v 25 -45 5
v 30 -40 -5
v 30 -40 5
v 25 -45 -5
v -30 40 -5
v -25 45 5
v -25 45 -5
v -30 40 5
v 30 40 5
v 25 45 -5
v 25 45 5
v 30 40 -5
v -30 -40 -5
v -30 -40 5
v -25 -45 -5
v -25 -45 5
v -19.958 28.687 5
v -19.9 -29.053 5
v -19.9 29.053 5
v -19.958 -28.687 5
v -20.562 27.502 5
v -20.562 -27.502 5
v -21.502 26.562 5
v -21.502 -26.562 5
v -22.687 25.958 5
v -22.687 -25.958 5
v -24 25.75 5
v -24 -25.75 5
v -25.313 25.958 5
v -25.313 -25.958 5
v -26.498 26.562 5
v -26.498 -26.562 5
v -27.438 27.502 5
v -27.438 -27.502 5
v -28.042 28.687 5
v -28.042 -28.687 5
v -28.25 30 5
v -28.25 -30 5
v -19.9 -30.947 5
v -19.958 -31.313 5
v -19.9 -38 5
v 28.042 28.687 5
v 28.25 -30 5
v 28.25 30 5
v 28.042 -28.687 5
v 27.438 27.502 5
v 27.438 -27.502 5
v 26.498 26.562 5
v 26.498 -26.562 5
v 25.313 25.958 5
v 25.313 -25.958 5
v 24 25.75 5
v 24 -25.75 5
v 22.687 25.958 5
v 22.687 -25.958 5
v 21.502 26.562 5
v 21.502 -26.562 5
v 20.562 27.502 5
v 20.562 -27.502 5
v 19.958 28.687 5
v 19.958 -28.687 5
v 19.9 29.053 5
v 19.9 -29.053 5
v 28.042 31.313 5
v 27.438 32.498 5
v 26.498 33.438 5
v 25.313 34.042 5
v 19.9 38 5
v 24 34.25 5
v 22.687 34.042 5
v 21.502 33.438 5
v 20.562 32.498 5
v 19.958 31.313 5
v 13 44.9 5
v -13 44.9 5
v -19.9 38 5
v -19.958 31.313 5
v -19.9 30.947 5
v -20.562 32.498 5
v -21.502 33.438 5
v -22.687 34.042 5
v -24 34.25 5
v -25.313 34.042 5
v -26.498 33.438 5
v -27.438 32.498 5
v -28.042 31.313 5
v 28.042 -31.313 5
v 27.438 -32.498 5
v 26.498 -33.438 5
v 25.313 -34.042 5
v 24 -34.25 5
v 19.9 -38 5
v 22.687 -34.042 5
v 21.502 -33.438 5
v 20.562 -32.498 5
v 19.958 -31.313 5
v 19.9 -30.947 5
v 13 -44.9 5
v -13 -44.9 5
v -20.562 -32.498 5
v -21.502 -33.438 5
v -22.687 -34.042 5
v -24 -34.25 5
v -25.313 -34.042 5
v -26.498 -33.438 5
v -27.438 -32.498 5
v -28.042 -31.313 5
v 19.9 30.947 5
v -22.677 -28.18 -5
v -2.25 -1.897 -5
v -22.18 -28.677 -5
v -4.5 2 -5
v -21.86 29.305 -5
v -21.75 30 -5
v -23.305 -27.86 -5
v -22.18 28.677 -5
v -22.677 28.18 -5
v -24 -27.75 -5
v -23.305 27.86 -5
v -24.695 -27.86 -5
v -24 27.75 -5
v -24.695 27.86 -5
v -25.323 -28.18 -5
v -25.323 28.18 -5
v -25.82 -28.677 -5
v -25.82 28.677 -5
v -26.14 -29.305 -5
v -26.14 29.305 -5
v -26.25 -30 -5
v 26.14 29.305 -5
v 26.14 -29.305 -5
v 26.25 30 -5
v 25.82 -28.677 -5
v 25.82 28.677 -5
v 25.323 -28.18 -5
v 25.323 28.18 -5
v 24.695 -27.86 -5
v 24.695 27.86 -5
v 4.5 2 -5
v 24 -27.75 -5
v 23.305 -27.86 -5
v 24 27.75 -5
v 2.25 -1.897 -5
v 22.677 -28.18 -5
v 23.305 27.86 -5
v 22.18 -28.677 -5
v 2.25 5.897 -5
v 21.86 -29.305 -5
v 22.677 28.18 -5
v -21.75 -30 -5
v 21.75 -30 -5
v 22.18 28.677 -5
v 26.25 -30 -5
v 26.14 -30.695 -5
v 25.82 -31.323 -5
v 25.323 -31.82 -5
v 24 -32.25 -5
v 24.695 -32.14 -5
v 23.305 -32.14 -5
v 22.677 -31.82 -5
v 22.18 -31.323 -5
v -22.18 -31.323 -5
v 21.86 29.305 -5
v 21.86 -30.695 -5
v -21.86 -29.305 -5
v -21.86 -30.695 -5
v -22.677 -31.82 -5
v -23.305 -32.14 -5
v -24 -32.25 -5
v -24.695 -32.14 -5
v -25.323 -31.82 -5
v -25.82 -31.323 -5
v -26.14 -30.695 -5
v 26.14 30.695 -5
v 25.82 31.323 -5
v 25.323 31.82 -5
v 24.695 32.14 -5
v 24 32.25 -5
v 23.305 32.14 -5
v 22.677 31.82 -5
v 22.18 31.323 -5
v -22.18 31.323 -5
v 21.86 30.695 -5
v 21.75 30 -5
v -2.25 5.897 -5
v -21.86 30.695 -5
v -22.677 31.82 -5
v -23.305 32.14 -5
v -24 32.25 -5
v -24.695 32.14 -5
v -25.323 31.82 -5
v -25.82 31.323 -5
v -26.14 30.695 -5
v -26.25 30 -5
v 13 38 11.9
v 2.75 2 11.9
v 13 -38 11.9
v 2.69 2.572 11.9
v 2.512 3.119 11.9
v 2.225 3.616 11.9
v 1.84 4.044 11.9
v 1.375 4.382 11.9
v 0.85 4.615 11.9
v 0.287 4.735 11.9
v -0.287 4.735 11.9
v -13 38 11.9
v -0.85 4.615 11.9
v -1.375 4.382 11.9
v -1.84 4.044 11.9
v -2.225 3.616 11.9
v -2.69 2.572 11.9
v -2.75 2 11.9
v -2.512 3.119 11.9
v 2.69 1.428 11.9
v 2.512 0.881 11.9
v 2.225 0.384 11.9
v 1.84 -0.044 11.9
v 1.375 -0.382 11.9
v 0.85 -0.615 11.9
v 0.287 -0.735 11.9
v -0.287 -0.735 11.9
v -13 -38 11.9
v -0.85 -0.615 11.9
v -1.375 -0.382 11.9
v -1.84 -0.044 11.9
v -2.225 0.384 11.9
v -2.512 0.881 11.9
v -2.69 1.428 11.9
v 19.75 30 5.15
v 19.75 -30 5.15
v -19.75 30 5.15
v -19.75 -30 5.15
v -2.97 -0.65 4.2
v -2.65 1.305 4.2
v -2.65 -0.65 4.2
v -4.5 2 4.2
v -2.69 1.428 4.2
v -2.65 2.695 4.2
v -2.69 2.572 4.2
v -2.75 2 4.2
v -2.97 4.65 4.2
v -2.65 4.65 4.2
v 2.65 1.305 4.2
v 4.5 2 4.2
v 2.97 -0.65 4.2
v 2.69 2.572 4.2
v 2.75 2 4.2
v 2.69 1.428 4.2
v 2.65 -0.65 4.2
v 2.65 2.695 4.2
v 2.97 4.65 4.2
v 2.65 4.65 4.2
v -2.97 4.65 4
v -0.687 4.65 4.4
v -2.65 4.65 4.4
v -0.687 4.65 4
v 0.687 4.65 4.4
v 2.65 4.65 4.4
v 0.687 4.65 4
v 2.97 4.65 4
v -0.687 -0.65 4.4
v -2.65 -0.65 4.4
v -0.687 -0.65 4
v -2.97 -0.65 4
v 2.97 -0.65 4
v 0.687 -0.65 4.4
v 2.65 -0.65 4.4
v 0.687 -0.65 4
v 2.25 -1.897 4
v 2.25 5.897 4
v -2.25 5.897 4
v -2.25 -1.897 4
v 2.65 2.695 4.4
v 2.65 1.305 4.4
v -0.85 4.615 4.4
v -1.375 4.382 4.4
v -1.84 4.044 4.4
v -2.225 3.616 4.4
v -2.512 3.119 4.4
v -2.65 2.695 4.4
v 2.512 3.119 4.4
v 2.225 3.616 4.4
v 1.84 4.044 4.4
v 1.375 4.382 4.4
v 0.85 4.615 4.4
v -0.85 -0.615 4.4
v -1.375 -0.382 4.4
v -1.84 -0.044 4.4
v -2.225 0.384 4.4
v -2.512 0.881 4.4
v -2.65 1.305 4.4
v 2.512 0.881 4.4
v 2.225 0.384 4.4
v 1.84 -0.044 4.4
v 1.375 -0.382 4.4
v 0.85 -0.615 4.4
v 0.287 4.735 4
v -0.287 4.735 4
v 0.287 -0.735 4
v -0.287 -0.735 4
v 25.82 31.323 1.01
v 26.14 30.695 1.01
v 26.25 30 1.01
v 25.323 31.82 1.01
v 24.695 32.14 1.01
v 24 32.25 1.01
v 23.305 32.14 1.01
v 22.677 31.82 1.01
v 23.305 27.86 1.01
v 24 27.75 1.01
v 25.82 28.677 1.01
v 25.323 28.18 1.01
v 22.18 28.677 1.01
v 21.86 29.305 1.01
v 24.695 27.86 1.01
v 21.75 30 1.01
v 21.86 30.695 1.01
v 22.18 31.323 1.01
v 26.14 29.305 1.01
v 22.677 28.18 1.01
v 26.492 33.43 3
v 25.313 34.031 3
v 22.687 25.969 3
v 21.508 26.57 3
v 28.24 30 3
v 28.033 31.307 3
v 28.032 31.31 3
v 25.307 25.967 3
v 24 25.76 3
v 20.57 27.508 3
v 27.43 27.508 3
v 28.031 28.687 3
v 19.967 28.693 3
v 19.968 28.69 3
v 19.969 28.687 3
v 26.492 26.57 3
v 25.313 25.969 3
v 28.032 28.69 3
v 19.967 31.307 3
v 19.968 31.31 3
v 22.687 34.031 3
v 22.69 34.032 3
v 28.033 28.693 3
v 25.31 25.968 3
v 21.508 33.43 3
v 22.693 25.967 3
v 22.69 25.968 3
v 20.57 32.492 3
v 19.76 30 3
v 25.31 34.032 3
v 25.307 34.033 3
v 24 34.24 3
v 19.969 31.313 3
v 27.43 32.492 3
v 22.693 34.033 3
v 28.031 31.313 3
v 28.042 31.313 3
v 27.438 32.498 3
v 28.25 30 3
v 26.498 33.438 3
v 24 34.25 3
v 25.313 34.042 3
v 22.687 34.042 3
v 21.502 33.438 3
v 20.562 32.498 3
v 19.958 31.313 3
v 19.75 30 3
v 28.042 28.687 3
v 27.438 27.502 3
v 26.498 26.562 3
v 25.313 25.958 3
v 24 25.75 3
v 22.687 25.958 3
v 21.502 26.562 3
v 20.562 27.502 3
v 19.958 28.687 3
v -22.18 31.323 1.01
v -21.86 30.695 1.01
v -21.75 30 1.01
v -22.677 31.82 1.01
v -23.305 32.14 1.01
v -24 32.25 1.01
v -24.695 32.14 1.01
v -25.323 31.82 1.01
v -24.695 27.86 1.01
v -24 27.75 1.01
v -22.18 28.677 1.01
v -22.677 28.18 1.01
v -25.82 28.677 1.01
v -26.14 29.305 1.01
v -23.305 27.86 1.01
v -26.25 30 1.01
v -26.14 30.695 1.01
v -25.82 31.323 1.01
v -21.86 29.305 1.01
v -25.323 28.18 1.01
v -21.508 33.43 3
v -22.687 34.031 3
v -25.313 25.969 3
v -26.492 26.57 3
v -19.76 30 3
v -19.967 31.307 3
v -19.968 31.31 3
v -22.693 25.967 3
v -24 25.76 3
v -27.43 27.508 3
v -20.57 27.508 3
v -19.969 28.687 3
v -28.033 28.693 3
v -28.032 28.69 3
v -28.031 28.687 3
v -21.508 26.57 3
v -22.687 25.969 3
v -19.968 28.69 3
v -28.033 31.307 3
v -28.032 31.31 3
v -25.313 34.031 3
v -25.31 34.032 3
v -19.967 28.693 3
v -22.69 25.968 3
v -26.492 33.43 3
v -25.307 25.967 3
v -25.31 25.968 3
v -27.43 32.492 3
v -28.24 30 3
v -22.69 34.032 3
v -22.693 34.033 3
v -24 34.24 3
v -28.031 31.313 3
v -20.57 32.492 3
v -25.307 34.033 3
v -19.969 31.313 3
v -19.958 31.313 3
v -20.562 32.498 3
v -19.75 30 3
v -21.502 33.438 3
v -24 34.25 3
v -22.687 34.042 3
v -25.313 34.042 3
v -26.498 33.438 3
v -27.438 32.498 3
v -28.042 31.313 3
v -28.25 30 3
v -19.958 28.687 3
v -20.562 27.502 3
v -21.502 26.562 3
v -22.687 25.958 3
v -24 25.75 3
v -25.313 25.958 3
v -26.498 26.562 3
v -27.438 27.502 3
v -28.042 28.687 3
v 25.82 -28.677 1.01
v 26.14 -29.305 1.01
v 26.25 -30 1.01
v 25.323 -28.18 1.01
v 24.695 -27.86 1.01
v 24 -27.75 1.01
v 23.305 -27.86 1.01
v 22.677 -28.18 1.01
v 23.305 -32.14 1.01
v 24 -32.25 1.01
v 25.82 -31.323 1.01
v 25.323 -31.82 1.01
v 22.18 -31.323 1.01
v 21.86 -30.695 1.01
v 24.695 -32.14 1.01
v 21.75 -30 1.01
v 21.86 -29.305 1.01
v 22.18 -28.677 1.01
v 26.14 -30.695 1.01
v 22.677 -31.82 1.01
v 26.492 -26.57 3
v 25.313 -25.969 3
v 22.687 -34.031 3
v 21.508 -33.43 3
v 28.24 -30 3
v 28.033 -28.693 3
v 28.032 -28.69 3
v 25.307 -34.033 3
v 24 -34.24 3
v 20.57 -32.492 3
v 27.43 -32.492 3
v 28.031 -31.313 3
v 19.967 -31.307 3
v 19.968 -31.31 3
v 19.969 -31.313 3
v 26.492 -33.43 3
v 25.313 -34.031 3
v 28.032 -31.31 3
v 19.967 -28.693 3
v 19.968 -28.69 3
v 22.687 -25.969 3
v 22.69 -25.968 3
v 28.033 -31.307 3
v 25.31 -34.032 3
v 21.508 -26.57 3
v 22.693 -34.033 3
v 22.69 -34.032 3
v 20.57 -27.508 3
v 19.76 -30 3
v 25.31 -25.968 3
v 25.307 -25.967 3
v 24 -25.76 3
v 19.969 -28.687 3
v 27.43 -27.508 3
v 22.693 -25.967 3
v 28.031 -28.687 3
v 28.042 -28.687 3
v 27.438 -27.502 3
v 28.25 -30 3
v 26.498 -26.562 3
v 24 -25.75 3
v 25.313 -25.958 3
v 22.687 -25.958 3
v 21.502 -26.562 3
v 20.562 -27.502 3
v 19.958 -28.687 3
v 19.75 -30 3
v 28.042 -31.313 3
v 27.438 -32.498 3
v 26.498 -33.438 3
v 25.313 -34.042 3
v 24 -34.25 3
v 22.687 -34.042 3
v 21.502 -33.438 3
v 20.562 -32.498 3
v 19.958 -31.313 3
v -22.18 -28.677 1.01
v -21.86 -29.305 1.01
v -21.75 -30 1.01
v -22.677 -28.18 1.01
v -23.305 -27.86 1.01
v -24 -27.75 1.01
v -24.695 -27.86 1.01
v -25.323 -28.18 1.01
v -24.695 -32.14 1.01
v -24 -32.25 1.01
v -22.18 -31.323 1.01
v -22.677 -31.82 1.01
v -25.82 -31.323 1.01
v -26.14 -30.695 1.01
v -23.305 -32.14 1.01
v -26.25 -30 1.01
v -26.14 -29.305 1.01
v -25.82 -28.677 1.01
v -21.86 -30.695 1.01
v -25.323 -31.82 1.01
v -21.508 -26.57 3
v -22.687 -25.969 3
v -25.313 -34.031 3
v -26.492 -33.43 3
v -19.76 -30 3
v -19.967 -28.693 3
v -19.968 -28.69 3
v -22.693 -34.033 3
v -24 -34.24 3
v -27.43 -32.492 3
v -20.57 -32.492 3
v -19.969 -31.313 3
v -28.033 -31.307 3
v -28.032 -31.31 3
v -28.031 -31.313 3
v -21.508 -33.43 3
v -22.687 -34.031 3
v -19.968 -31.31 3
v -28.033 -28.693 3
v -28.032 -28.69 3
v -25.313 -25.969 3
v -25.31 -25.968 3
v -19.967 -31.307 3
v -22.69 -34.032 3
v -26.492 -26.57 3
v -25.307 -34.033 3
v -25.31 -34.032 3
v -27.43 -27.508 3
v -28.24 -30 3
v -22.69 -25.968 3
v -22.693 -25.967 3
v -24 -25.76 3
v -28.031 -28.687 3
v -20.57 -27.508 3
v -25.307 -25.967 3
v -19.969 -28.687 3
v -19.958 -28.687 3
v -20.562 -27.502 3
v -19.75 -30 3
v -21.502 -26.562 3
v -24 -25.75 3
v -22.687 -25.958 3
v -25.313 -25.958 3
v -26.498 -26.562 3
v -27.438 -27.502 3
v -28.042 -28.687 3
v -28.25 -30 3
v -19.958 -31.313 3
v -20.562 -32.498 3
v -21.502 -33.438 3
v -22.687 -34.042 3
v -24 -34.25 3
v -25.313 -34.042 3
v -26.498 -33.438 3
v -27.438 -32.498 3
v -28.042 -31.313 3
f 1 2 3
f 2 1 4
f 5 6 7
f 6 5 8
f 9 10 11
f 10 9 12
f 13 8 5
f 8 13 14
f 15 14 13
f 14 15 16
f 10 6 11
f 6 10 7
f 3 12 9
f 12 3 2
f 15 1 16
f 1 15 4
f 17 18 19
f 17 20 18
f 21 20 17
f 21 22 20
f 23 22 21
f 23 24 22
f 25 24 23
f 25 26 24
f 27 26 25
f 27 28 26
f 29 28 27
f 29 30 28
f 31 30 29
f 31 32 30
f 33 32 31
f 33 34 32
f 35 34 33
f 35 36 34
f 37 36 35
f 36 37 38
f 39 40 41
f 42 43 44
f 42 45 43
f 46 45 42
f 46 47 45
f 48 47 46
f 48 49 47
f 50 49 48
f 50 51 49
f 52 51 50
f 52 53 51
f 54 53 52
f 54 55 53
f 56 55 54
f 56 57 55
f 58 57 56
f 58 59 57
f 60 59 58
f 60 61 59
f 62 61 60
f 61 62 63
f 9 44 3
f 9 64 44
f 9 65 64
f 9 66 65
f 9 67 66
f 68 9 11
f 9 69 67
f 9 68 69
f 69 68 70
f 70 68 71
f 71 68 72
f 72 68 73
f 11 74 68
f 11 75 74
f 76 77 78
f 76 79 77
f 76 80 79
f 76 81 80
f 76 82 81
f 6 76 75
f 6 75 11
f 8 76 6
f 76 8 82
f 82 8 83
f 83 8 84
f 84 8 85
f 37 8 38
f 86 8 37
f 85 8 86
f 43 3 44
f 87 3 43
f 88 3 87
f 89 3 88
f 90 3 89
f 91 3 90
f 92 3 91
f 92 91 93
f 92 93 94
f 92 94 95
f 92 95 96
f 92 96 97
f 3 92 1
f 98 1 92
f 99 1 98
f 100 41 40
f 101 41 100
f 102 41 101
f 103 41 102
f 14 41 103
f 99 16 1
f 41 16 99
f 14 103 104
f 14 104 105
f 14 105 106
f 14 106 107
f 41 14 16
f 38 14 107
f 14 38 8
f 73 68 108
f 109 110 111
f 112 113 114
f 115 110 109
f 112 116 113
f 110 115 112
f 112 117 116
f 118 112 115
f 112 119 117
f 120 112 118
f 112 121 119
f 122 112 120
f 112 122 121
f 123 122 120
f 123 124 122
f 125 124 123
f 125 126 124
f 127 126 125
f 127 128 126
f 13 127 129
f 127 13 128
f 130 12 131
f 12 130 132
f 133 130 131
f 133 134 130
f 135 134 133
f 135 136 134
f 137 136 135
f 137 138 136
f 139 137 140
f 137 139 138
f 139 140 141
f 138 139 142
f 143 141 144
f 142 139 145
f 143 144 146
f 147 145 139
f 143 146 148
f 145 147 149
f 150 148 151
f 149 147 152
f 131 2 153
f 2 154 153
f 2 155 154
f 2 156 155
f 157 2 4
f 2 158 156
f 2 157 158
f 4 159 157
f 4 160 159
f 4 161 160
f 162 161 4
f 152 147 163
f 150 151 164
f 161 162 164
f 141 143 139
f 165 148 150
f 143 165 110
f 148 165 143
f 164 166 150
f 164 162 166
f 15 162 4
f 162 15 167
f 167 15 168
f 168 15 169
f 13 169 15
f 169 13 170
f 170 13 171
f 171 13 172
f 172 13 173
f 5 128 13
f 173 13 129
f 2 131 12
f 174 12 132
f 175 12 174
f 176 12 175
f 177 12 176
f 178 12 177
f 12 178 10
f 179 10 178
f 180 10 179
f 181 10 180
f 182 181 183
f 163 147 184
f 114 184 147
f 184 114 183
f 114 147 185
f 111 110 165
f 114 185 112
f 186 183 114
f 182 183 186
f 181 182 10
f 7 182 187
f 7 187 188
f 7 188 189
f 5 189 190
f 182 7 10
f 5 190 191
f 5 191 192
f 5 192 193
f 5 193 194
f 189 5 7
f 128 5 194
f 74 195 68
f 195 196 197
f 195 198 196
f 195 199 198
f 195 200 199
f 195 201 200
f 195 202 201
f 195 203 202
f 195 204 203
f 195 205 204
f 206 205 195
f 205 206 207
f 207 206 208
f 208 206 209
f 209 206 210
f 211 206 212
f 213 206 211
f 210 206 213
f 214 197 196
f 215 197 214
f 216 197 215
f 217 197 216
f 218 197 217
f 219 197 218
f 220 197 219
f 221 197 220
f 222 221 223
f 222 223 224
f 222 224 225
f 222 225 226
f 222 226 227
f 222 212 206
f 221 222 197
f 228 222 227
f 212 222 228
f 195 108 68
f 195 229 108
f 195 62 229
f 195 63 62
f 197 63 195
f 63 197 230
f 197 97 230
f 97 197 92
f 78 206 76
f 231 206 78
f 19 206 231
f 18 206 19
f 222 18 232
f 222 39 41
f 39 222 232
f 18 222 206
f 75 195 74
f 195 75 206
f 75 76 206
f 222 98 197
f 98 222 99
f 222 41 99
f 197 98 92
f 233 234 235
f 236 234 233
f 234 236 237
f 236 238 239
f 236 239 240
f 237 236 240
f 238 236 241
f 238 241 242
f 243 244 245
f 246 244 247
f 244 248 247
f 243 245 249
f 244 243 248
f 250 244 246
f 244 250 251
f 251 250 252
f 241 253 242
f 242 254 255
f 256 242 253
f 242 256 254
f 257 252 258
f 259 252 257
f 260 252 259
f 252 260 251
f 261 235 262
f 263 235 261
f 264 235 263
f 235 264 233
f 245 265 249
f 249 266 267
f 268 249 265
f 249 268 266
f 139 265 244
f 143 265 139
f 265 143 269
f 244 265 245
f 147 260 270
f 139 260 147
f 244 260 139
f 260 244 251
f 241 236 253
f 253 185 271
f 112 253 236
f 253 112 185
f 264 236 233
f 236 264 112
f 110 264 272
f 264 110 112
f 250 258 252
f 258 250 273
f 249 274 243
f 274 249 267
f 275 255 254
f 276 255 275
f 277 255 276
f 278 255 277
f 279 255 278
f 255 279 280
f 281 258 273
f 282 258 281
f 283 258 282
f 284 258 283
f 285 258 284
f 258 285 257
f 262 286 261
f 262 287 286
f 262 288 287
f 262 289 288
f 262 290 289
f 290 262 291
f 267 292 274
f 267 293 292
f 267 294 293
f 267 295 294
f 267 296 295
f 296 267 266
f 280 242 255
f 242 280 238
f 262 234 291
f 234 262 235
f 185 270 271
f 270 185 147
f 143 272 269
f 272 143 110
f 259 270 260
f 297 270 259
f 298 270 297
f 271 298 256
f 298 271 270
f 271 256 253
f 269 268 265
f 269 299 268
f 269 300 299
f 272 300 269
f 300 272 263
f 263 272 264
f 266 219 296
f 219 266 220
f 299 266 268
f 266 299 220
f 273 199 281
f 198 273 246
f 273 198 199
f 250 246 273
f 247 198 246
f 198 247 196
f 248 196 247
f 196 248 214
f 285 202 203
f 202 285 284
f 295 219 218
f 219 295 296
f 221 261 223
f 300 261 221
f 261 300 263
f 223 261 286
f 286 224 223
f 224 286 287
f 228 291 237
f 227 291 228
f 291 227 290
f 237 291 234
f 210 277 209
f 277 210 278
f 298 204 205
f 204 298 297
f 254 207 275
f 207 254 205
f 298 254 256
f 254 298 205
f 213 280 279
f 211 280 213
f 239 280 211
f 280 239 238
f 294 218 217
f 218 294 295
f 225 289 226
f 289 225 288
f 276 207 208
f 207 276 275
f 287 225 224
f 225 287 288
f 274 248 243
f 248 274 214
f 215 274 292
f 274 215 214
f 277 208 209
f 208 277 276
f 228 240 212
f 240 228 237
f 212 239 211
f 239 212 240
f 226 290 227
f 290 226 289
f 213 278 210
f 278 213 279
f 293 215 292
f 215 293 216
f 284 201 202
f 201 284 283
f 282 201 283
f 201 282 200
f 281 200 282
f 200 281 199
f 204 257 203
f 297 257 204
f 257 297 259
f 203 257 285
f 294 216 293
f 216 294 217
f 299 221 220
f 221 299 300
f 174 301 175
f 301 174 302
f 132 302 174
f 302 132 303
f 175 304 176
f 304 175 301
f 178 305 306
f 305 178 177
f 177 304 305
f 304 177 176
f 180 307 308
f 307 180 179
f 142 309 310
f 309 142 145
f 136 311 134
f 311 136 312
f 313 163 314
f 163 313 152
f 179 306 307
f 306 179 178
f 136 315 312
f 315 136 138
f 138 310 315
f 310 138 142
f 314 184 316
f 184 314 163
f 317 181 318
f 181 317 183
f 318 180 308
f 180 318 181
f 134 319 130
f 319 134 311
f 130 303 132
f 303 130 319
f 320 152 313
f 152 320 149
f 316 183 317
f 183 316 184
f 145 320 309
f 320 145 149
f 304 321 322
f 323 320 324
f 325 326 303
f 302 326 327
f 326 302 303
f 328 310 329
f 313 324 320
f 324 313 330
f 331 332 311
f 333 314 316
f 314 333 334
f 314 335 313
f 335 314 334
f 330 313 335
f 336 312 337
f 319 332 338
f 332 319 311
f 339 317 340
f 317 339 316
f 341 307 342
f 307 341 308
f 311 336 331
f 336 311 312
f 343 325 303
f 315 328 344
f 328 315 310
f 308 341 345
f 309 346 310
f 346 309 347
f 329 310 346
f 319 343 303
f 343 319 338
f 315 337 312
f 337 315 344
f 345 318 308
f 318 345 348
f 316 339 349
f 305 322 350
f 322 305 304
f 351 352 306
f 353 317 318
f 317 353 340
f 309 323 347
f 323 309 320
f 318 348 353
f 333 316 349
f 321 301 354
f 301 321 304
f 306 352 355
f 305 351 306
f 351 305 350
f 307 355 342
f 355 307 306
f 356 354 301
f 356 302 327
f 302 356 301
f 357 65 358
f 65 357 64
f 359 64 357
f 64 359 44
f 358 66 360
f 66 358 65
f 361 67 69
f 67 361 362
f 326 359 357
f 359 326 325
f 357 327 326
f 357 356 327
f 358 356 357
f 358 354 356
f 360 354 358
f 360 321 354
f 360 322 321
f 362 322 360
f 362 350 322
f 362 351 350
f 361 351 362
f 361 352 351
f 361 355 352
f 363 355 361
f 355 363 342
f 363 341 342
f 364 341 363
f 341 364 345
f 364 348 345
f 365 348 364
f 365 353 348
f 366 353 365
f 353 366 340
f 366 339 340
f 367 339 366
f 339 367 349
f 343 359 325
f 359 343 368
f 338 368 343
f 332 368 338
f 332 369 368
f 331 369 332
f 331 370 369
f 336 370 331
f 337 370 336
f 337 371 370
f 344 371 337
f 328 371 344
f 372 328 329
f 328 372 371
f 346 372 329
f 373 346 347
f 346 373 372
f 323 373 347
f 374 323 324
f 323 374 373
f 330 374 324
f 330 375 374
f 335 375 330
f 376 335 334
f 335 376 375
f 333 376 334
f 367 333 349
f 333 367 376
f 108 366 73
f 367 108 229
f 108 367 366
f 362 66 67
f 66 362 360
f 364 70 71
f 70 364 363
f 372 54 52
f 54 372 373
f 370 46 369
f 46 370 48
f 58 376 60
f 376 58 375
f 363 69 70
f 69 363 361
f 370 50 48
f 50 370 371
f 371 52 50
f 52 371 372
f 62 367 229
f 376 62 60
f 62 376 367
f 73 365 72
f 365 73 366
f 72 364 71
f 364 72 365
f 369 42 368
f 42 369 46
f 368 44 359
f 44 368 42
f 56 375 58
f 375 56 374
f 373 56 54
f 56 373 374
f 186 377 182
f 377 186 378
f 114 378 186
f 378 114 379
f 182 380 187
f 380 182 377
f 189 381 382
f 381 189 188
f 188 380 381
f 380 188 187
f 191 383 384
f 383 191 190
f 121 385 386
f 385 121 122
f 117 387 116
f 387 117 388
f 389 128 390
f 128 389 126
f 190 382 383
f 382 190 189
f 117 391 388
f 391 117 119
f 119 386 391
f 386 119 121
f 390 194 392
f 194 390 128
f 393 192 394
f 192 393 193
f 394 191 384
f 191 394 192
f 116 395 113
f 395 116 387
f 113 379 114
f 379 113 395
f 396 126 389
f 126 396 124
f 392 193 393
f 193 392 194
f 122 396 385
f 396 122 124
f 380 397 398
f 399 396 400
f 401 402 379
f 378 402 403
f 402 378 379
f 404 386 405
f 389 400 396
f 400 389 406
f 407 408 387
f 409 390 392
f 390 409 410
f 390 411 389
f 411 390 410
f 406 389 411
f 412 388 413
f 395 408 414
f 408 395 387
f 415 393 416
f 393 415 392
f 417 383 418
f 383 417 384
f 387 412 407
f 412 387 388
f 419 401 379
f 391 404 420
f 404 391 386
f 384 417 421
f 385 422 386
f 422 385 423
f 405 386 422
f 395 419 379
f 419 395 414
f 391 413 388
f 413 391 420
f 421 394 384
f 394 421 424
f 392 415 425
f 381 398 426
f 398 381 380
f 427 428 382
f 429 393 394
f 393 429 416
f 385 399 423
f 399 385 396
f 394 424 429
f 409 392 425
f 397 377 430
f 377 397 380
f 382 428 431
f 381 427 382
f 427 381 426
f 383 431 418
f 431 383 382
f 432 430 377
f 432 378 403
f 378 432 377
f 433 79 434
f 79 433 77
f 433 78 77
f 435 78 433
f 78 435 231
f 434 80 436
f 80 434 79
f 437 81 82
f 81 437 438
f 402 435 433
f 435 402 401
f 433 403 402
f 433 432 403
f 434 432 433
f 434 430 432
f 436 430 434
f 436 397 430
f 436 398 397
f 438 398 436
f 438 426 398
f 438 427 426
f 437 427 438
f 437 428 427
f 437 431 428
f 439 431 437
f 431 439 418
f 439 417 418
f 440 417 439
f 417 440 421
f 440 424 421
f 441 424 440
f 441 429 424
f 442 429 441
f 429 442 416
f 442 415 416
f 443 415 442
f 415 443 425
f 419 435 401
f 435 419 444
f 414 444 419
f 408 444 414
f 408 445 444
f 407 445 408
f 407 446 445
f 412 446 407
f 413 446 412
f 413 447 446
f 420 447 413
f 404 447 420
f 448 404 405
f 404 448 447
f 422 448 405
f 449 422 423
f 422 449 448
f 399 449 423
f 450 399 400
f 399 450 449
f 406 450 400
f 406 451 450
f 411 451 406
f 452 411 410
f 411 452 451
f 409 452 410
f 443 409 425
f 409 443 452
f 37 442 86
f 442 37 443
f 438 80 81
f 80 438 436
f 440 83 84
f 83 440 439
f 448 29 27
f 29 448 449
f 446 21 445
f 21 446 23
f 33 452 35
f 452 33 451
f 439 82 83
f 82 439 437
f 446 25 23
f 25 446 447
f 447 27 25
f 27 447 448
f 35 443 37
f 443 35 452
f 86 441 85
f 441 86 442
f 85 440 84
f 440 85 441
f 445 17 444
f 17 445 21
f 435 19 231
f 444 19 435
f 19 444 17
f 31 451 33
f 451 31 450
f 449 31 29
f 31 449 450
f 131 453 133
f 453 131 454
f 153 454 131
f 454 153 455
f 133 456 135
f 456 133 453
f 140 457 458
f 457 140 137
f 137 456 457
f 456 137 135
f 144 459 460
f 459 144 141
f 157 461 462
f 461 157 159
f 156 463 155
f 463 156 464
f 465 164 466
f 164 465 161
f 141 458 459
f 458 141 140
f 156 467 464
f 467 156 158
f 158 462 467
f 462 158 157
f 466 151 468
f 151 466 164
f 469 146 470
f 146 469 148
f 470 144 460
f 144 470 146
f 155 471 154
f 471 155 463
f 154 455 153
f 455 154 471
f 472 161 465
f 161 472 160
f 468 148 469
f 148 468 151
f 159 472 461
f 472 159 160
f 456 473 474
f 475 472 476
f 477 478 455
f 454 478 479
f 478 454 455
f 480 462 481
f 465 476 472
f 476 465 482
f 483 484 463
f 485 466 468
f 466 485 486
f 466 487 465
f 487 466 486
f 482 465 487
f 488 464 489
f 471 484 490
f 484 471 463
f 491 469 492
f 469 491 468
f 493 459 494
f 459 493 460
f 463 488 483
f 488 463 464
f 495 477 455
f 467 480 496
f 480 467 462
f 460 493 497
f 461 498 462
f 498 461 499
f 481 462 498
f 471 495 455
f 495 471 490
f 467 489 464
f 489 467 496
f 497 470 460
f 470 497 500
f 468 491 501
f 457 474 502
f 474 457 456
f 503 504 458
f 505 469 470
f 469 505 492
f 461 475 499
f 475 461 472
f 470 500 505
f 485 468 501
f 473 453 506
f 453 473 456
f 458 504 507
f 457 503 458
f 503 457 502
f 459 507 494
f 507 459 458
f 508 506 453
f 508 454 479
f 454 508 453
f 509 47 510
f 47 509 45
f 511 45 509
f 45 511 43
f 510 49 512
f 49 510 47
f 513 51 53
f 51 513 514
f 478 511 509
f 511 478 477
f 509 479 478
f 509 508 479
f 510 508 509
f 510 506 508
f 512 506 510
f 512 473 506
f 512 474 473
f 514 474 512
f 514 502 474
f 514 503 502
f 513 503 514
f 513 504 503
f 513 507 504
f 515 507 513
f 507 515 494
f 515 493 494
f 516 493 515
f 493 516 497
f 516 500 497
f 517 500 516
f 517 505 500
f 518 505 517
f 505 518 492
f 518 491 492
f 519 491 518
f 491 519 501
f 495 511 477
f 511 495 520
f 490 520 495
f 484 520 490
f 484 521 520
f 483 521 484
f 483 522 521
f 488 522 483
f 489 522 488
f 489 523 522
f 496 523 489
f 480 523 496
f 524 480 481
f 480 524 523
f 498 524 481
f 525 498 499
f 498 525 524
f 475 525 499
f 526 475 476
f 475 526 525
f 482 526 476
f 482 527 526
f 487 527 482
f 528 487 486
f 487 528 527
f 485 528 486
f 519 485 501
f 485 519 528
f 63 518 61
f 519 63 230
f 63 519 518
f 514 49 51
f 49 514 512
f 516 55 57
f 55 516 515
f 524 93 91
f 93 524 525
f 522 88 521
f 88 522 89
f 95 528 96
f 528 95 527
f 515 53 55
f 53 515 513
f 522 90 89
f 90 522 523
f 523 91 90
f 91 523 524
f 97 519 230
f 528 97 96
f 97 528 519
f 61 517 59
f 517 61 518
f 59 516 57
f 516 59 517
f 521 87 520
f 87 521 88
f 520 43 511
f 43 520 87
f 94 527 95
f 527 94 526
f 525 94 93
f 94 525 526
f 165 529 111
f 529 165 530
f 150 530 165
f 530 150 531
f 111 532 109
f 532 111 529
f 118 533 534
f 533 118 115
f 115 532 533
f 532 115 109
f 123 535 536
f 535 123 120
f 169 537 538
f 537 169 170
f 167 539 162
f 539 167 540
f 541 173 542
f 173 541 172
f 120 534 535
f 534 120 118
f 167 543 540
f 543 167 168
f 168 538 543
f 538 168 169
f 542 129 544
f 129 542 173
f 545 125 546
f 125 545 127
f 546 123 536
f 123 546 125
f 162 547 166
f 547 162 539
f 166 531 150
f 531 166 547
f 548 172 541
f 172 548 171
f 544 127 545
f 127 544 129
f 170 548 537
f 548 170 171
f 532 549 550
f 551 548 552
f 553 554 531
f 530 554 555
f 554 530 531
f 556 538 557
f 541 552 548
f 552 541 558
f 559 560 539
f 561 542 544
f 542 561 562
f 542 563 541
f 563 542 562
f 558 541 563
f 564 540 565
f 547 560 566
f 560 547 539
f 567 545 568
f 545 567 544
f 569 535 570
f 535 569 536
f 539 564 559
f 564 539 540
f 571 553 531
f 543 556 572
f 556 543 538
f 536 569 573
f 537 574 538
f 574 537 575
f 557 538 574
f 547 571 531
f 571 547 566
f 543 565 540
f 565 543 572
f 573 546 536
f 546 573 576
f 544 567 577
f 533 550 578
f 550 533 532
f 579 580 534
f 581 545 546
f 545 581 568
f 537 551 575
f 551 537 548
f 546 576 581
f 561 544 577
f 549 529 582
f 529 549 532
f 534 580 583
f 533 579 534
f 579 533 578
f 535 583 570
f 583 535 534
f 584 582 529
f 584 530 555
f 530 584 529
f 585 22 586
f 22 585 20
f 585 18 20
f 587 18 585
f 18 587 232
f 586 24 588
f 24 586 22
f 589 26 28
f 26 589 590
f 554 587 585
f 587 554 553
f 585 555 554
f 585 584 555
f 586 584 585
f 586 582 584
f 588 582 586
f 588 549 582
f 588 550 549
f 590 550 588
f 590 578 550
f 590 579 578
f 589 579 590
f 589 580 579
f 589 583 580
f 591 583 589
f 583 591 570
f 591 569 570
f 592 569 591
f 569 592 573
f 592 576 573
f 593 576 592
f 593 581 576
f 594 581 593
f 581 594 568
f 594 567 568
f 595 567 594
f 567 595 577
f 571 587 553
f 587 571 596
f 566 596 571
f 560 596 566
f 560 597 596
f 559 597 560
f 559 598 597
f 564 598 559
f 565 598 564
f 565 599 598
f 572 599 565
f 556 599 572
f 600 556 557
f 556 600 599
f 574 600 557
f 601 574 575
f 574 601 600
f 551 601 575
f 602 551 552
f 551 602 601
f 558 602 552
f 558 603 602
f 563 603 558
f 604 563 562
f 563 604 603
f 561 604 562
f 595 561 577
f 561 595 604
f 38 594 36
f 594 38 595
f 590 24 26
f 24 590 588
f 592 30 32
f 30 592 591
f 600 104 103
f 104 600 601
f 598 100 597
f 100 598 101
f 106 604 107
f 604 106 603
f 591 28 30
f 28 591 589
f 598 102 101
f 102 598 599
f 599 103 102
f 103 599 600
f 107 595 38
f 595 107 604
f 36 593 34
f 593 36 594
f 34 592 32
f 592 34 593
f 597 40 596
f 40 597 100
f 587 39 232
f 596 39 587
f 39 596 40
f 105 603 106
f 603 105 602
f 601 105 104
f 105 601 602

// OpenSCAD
// file: ../Dollo/NEW_long_ties/globals.scad
/*
Most things in this file is represented as one millimeter, so keep that in mind while changing things.
Some of the setting are not mm but at variables that you can set, such as 2*x=2x and you are setting what x is.
I will try to specify when things are variables and not exact measurements.
*/

// printer slop
slop = 0.15;

obj_leg = 30;
leg_length = 5.5;
small_number = 0.001;
metal_core_rode_global = 5;


///////////////// number of holes /////////////////////
z_hole_number = 8;
other_holes = 8;

///////////////// Pins /////////////////////

//pins that poke out
ball_size = 10;
pin_height = 20;
pin_diameter = 6;


//holes
hole_ball_size = ball_size;
hole_pin_height = pin_height;
hole_pin_diameter = pin_diameter;

///////////////// Z THINGS /////////////////////

berring_slot_width = 7.5;
berring_slot_depth = 6.5;
metal_core_rode = 5;

///////////////// X THINGS /////////////////////

//male dove tails
male_dove_max_width=8;
male_dove_min_width=5;
male_dove_depth=5;
male_dove_height=obj_leg/2;

function scaled_male_dove_max_width() = male_dove_max_width - slop;
function scaled_male_dove_min_width() = male_dove_min_width - slop;
function scaled_male_dove_depth() = male_dove_depth - slop;

//female dove tails, this is found on the y mounts
girl_max_width=11;
girl_min_width=5;
girl_depth=5;
girl_height=obj_leg;


///////////////// Y THINGS /////////////////////
/*
The Y is so normal that all of those global variables at the top should change all of the setting in it, this section is set her incase there are variables set in the future development of this project.
*/

// stepper
motor_side_length = 43.2;
motor_bolt_hole_distance = 31;
motor_center_hole = 23;
motor_shaft_dia = 5;
motor_shaft_hole_dia = 5+2*slop;

// bolts etc.
bolt_hole_dia = 3+2*slop;
bolt_head_hole_dia = 5.8;

m4_bolt_hole_dia = 4+2*slop;
m4_bolt_head_hole_dia = 6.8+2*slop;


m3_nut_side = 5.65;
m3_nut_height = 2.3;
m4_nut_side = 6.85;
m4_nut_height = 3.1;

// threaded rod
lifter_rod_diam = 9.86;
hole_threaded_rod = lifter_rod_diam+2*slop;

// for the extensions
metal_rod_size = 9;
// main file
use <../Dollo/NEW_long_ties/include.scad>;


w = 110;
h = 60;

//debug();
//debug_table_to_table_bracket();
//debug_table_wall_bracket_2();

//table_wall_bracket();
//table_wall_bracket_2();
table_bracket();
//knob();
//table_to_table_bracket();


module screw_hole() {
    rotate([-90, 0, 0]) {
        cylinder(d=4.5, h=100, center=true, $fn=20);
        cylinder(
            d1=10, d2=24, h=50,
            center=true, $fn=20
        );
    }
    
}

module screw_hole_2() {
    union() {
        cylinder(d=4.5, h=100, center=true, $fn=20);

        cylinder(d1=4.5, d2=8.5, h=2, $fn=20);

        translate([0, 0, 1.99])
        cylinder(d=8.5, h=12, $fn=20);
    }
}

module _table_wall_bracket() {
    difference() {
        cube([w, w, h], center=true);

        hull() {
            cylinder(d=w/2, h=80, center=true, $fn=80);

            translate([w/4, w, 0])
            cube([w, w, h + 10], center=true);

            translate([w, w/2 - w/2.5, 0])
            cube([w, w, h + 10], center=true);
        }

        // positioning hole
        translate([-w/2 - 3, 20, 0])
        chamfered_cube(20, w, h/1.5, 7, center=true);

        // chamfers
        translate([w/2, 0, h/2])
        rotate([0, 45, 0])
        cube([10, 200, 10], center=true);

        translate([w/2, 0, -h/2])
        rotate([0, 45, 0])
        cube([10, 200, 10], center=true);

        translate([0, w/2, h/2])
        rotate([45, 0, 0])
        cube([200, 10, 10], center=true);

        translate([0, w/2, -h/2])
        rotate([45, 0, 0])
        cube([200, 10, 10], center=true);

        translate([-w/2, -w/2, 0])
        rotate([0, 0, 45])
        cube([15, 15, h + 10], center=true);

        // screw holes
        translate([w/2 - 10, -w/2 + 50/2 + 7, -h/2 + 10])
        screw_hole();

        translate([w/2 - 10, -w/2 + 50/2 + 7, h/2 - 10])
        screw_hole();

        translate([-10, -w/2 + 50/2 + 7, -h/2 + 10])
        screw_hole();

        translate([-10, -w/2 + 50/2 + 7, h/2 - 10])
        screw_hole();

        translate([-w/2, 12, 0])
        hull() {
            rotate([45, 0, 0])
            cube([70, 7, 7], center=true);

            translate([0, w/5, 0])
            rotate([45, 0, 0])
            cube([70, 7, 7], center=true);
        }
    }
}

module table_wall_bracket() {
    difference() {
        rotate([90, 0, 0])
        _table_wall_bracket();

        // infill
        translate([-w/2 + 10, -h/2 + 10, 0])
        cube([0.1, 2, w * 2], center=true);

        translate([-w/2 + 10, h/2 - 10, 0])
        cube([0.1, 2, w * 2], center=true);

        translate([-w/2 + 17, -h/2 + 19, 0])
        cube([0.1, 2, w * 2], center=true);

        translate([-w/2 + 17, h/2 - 19, 0])
        cube([0.1, 2, w * 2], center=true);
    }
}

module table_bracket() {
    difference() {
        union() {
            chamfered_cube_side(
                h, 90, 10, 5, center=true);

            translate([0, 0, 10/2 - 0.6])
            chamfered_cube(
                h/1.5, 90, 15, 7, center=true);
        }

        translate([0, 2, -10/2 - 1]) {
            M5_nut(10, cone=false, bridging=true);

            cylinder(d=5.5, h=40, center=true, $fn=30);
        }

        translate([h/2 - 6, 90/2 - 15, 1.01])
        screw_hole_2();

        translate([-h/2 + 6, 90/2 - 15, 1.01])
        screw_hole_2();

        translate([h/2 - 6, -90/2 + 15, 1.01])
        screw_hole_2();

        translate([-h/2 + 6, -90/2 + 15, 1.01])
        screw_hole_2();
    }
}

module knob() {

    ridges = 25;
    
    difference() {
        union() {
            translate([0, 0, 2.32])
            rounded_cylinder(35, 18, 4, $fn=80);

            cylinder(d1=35 - 6 - 1, d2=35 - 1, h=3, $fn=80);
        }

        for(i = [1:ridges]) {
            rotate([0, 0, i * 360/ridges])
            translate([35/2, 0, 0])
            cylinder(d=3, h=50, $fn=30);
        }

        translate([0, 0, 14])
        M5_nut(10);

        cylinder(d=5.4, h=40, center=true, $fn=20);
    }
}

module table_to_table_bracket() {
    rotate([0, 90, 0])
    difference() {
        chamfered_cube_side(60, 140, 35, 5, center=true);

        translate([0, 140/2 - (60 - 65/2), 35/2 - (22 - 30/2)])
        cube([70, 65, 30], center=true);

        // positioning hole
        translate([0, 0, 35/2 + 1/2])
        chamfered_cube(h/1.5, 200, 15, 7, center=true);

        translate([0, -100/2 - 5, -35/2 - 10])
        chamfered_cube(200, 125, 50, 20, center=true);

        translate([0, -37, 0])
        cylinder(d=8, h=100, center=true, $fn=40);

        #translate([-60/2 + 10, 140/2 - 10, -35/2 - 25 + 6])
        rotate([-90, 0, 0])
        screw_hole();

        #translate([60/2 - 10, 140/2 - 10, -35/2 - 25 + 6])
        rotate([-90, 0, 0])
        screw_hole();

        #translate([-60/2 + 10, 140/2 - 50, -35/2 - 25 + 6])
        rotate([-90, 0, 0])
        screw_hole();

        #translate([60/2 - 10, 140/2 - 50, -35/2 - 25 + 6])
        rotate([-90, 0, 0])
        screw_hole();

        translate([0, -140/2, -15])
        rotate([45, 0, 0])
        cube([70, 30, 30], center=true);

        // infill
        translate([0, 2, -8])
        rotate([45, 0, 0])
        cube([70, 4, 0.1], center=true);

        translate([0, 1, -1])
        rotate([45, 0, 0])
        cube([70, 4, 0.1], center=true);

        translate([0, 0, 6])
        rotate([45, 0, 0])
        cube([70, 4, 0.1], center=true);

        translate([0, 30, -11])
        rotate([45, 0, 0])
        cube([70, 4, 0.1], center=true);

        translate([0, 50, -11])
        rotate([45, 0, 0])
        cube([70, 4, 0.1], center=true);

        translate([0, -20, 4])
        rotate([45, 0, 0])
        cube([70, 4, 0.1], center=true);

        translate([0, -50, 4])
        rotate([45, 0, 0])
        cube([70, 4, 0.1], center=true);

    }
}

module table_wall_bracket_2() {
    l = 86 + 65;

    angle = atan(20/(l - 15));

    rotate([angle, 0, 0])
    translate([0, -l/2 + 10, 90/2])
    rotate([0, 90, 0])
    difference() {
        union() {
            chamfered_cube_side(50, l, 15, 5, center=true);

            translate([0, l/2 - 10/2, 0])
            rotate([90, 0, 0])
            chamfered_cube_side(90, 28, 10, 4, center=true);

            hull() {
                translate([-90/2 + 1/2, l/2 - 10 + 1/2, 0])
                cube([1, 1, 5], center=true);

                translate([-50/2 + 1/2, 0, 0])
                cube([1, l - 10, 15], center=true);
            }

            mirror([1, 0, 0])
            hull() {
                translate([-90/2 + 1/2, l/2 - 10 + 1/2, 0])
                cube([1, 1, 5], center=true);

                translate([-50/2 + 1/2, 0, 0])
                cube([1, l - 10, 15], center=true);
            }
        }

        // positioning hole
        translate([0, -20, 15/2 + 1/2])
        chamfered_cube(h/1.5, l, 15, 7, center=true);

        // screw holes
        translate([-90/2 + 6, l/2 - 5, 9])
        rotate([90, 0, 0])
        screw_hole_2();

        translate([-90/2 + 6, l/2 - 5, -9])
        rotate([90, 0, 0])
        screw_hole_2();

        translate([90/2 - 6, l/2 - 5, 9])
        rotate([90, 0, 0])
        screw_hole_2();

        translate([90/2 - 6, l/2 - 5, -9])
        rotate([90, 0, 0])
        screw_hole_2();

        translate([0, l/2 - 90/2 - 86 + 2, 0])
        cylinder(d=8, h=100, center=true, $fn=40);
    }
}

module debug() {
    intersection() {
        table_wall_bracket();

        translate([0, 0, -10])
        cube([200, 200, 40], center=true);
    }

    translate([-w/2 - 10/2 - 0.1, 10, 0])
    rotate([0, 90, 0])
    table_bracket();
}

module debug_table_to_table_bracket() {
    //%translate([-200/2, 0, 18/2])
    //cube([200, 200, 18], center=true);

    %translate([200/2, 0, 50/2])
    cube([200, 200, 50], center=true);

    translate([-90/2, 0, 18 + 10/2])
    rotate([0, 0, 90])
    table_bracket();

    translate([-10, 0, 35/2 + 50 - 22])
    rotate([180, 0, 90])
    table_to_table_bracket();

    translate([-47, 0, 48])
    knob();

    #translate([-47, 0, 44])
    cylinder(d=5, h=44, center=true);
}

module debug_table_wall_bracket_2() {
    l = 86 + 65;

    //%translate([0, l/2 - 100/2 - 86, 15/2 + 10 + 50/2])
    //cube([100, 100, 50], center=true);

    angle = atan(20/(l - 15));
    
    
    rotate([0, -90, 0])
    translate([0, l/2 - 10, -90/2])
    rotate([-angle, 0, 0])
    table_wall_bracket_2();

    translate([0, l/2 - 90/2 - 86, 15/2 + 10/2])
    rotate([0, 180, 0])
    table_bracket();

    translate([0, l/2 - 90/2 - 86 + 2, -7.5])
    rotate([0, 180, 0])
    knob();

    #translate([0, l/2 - 90/2 - 86 + 2, -25])
    cylinder(d=5, h=40);
}
